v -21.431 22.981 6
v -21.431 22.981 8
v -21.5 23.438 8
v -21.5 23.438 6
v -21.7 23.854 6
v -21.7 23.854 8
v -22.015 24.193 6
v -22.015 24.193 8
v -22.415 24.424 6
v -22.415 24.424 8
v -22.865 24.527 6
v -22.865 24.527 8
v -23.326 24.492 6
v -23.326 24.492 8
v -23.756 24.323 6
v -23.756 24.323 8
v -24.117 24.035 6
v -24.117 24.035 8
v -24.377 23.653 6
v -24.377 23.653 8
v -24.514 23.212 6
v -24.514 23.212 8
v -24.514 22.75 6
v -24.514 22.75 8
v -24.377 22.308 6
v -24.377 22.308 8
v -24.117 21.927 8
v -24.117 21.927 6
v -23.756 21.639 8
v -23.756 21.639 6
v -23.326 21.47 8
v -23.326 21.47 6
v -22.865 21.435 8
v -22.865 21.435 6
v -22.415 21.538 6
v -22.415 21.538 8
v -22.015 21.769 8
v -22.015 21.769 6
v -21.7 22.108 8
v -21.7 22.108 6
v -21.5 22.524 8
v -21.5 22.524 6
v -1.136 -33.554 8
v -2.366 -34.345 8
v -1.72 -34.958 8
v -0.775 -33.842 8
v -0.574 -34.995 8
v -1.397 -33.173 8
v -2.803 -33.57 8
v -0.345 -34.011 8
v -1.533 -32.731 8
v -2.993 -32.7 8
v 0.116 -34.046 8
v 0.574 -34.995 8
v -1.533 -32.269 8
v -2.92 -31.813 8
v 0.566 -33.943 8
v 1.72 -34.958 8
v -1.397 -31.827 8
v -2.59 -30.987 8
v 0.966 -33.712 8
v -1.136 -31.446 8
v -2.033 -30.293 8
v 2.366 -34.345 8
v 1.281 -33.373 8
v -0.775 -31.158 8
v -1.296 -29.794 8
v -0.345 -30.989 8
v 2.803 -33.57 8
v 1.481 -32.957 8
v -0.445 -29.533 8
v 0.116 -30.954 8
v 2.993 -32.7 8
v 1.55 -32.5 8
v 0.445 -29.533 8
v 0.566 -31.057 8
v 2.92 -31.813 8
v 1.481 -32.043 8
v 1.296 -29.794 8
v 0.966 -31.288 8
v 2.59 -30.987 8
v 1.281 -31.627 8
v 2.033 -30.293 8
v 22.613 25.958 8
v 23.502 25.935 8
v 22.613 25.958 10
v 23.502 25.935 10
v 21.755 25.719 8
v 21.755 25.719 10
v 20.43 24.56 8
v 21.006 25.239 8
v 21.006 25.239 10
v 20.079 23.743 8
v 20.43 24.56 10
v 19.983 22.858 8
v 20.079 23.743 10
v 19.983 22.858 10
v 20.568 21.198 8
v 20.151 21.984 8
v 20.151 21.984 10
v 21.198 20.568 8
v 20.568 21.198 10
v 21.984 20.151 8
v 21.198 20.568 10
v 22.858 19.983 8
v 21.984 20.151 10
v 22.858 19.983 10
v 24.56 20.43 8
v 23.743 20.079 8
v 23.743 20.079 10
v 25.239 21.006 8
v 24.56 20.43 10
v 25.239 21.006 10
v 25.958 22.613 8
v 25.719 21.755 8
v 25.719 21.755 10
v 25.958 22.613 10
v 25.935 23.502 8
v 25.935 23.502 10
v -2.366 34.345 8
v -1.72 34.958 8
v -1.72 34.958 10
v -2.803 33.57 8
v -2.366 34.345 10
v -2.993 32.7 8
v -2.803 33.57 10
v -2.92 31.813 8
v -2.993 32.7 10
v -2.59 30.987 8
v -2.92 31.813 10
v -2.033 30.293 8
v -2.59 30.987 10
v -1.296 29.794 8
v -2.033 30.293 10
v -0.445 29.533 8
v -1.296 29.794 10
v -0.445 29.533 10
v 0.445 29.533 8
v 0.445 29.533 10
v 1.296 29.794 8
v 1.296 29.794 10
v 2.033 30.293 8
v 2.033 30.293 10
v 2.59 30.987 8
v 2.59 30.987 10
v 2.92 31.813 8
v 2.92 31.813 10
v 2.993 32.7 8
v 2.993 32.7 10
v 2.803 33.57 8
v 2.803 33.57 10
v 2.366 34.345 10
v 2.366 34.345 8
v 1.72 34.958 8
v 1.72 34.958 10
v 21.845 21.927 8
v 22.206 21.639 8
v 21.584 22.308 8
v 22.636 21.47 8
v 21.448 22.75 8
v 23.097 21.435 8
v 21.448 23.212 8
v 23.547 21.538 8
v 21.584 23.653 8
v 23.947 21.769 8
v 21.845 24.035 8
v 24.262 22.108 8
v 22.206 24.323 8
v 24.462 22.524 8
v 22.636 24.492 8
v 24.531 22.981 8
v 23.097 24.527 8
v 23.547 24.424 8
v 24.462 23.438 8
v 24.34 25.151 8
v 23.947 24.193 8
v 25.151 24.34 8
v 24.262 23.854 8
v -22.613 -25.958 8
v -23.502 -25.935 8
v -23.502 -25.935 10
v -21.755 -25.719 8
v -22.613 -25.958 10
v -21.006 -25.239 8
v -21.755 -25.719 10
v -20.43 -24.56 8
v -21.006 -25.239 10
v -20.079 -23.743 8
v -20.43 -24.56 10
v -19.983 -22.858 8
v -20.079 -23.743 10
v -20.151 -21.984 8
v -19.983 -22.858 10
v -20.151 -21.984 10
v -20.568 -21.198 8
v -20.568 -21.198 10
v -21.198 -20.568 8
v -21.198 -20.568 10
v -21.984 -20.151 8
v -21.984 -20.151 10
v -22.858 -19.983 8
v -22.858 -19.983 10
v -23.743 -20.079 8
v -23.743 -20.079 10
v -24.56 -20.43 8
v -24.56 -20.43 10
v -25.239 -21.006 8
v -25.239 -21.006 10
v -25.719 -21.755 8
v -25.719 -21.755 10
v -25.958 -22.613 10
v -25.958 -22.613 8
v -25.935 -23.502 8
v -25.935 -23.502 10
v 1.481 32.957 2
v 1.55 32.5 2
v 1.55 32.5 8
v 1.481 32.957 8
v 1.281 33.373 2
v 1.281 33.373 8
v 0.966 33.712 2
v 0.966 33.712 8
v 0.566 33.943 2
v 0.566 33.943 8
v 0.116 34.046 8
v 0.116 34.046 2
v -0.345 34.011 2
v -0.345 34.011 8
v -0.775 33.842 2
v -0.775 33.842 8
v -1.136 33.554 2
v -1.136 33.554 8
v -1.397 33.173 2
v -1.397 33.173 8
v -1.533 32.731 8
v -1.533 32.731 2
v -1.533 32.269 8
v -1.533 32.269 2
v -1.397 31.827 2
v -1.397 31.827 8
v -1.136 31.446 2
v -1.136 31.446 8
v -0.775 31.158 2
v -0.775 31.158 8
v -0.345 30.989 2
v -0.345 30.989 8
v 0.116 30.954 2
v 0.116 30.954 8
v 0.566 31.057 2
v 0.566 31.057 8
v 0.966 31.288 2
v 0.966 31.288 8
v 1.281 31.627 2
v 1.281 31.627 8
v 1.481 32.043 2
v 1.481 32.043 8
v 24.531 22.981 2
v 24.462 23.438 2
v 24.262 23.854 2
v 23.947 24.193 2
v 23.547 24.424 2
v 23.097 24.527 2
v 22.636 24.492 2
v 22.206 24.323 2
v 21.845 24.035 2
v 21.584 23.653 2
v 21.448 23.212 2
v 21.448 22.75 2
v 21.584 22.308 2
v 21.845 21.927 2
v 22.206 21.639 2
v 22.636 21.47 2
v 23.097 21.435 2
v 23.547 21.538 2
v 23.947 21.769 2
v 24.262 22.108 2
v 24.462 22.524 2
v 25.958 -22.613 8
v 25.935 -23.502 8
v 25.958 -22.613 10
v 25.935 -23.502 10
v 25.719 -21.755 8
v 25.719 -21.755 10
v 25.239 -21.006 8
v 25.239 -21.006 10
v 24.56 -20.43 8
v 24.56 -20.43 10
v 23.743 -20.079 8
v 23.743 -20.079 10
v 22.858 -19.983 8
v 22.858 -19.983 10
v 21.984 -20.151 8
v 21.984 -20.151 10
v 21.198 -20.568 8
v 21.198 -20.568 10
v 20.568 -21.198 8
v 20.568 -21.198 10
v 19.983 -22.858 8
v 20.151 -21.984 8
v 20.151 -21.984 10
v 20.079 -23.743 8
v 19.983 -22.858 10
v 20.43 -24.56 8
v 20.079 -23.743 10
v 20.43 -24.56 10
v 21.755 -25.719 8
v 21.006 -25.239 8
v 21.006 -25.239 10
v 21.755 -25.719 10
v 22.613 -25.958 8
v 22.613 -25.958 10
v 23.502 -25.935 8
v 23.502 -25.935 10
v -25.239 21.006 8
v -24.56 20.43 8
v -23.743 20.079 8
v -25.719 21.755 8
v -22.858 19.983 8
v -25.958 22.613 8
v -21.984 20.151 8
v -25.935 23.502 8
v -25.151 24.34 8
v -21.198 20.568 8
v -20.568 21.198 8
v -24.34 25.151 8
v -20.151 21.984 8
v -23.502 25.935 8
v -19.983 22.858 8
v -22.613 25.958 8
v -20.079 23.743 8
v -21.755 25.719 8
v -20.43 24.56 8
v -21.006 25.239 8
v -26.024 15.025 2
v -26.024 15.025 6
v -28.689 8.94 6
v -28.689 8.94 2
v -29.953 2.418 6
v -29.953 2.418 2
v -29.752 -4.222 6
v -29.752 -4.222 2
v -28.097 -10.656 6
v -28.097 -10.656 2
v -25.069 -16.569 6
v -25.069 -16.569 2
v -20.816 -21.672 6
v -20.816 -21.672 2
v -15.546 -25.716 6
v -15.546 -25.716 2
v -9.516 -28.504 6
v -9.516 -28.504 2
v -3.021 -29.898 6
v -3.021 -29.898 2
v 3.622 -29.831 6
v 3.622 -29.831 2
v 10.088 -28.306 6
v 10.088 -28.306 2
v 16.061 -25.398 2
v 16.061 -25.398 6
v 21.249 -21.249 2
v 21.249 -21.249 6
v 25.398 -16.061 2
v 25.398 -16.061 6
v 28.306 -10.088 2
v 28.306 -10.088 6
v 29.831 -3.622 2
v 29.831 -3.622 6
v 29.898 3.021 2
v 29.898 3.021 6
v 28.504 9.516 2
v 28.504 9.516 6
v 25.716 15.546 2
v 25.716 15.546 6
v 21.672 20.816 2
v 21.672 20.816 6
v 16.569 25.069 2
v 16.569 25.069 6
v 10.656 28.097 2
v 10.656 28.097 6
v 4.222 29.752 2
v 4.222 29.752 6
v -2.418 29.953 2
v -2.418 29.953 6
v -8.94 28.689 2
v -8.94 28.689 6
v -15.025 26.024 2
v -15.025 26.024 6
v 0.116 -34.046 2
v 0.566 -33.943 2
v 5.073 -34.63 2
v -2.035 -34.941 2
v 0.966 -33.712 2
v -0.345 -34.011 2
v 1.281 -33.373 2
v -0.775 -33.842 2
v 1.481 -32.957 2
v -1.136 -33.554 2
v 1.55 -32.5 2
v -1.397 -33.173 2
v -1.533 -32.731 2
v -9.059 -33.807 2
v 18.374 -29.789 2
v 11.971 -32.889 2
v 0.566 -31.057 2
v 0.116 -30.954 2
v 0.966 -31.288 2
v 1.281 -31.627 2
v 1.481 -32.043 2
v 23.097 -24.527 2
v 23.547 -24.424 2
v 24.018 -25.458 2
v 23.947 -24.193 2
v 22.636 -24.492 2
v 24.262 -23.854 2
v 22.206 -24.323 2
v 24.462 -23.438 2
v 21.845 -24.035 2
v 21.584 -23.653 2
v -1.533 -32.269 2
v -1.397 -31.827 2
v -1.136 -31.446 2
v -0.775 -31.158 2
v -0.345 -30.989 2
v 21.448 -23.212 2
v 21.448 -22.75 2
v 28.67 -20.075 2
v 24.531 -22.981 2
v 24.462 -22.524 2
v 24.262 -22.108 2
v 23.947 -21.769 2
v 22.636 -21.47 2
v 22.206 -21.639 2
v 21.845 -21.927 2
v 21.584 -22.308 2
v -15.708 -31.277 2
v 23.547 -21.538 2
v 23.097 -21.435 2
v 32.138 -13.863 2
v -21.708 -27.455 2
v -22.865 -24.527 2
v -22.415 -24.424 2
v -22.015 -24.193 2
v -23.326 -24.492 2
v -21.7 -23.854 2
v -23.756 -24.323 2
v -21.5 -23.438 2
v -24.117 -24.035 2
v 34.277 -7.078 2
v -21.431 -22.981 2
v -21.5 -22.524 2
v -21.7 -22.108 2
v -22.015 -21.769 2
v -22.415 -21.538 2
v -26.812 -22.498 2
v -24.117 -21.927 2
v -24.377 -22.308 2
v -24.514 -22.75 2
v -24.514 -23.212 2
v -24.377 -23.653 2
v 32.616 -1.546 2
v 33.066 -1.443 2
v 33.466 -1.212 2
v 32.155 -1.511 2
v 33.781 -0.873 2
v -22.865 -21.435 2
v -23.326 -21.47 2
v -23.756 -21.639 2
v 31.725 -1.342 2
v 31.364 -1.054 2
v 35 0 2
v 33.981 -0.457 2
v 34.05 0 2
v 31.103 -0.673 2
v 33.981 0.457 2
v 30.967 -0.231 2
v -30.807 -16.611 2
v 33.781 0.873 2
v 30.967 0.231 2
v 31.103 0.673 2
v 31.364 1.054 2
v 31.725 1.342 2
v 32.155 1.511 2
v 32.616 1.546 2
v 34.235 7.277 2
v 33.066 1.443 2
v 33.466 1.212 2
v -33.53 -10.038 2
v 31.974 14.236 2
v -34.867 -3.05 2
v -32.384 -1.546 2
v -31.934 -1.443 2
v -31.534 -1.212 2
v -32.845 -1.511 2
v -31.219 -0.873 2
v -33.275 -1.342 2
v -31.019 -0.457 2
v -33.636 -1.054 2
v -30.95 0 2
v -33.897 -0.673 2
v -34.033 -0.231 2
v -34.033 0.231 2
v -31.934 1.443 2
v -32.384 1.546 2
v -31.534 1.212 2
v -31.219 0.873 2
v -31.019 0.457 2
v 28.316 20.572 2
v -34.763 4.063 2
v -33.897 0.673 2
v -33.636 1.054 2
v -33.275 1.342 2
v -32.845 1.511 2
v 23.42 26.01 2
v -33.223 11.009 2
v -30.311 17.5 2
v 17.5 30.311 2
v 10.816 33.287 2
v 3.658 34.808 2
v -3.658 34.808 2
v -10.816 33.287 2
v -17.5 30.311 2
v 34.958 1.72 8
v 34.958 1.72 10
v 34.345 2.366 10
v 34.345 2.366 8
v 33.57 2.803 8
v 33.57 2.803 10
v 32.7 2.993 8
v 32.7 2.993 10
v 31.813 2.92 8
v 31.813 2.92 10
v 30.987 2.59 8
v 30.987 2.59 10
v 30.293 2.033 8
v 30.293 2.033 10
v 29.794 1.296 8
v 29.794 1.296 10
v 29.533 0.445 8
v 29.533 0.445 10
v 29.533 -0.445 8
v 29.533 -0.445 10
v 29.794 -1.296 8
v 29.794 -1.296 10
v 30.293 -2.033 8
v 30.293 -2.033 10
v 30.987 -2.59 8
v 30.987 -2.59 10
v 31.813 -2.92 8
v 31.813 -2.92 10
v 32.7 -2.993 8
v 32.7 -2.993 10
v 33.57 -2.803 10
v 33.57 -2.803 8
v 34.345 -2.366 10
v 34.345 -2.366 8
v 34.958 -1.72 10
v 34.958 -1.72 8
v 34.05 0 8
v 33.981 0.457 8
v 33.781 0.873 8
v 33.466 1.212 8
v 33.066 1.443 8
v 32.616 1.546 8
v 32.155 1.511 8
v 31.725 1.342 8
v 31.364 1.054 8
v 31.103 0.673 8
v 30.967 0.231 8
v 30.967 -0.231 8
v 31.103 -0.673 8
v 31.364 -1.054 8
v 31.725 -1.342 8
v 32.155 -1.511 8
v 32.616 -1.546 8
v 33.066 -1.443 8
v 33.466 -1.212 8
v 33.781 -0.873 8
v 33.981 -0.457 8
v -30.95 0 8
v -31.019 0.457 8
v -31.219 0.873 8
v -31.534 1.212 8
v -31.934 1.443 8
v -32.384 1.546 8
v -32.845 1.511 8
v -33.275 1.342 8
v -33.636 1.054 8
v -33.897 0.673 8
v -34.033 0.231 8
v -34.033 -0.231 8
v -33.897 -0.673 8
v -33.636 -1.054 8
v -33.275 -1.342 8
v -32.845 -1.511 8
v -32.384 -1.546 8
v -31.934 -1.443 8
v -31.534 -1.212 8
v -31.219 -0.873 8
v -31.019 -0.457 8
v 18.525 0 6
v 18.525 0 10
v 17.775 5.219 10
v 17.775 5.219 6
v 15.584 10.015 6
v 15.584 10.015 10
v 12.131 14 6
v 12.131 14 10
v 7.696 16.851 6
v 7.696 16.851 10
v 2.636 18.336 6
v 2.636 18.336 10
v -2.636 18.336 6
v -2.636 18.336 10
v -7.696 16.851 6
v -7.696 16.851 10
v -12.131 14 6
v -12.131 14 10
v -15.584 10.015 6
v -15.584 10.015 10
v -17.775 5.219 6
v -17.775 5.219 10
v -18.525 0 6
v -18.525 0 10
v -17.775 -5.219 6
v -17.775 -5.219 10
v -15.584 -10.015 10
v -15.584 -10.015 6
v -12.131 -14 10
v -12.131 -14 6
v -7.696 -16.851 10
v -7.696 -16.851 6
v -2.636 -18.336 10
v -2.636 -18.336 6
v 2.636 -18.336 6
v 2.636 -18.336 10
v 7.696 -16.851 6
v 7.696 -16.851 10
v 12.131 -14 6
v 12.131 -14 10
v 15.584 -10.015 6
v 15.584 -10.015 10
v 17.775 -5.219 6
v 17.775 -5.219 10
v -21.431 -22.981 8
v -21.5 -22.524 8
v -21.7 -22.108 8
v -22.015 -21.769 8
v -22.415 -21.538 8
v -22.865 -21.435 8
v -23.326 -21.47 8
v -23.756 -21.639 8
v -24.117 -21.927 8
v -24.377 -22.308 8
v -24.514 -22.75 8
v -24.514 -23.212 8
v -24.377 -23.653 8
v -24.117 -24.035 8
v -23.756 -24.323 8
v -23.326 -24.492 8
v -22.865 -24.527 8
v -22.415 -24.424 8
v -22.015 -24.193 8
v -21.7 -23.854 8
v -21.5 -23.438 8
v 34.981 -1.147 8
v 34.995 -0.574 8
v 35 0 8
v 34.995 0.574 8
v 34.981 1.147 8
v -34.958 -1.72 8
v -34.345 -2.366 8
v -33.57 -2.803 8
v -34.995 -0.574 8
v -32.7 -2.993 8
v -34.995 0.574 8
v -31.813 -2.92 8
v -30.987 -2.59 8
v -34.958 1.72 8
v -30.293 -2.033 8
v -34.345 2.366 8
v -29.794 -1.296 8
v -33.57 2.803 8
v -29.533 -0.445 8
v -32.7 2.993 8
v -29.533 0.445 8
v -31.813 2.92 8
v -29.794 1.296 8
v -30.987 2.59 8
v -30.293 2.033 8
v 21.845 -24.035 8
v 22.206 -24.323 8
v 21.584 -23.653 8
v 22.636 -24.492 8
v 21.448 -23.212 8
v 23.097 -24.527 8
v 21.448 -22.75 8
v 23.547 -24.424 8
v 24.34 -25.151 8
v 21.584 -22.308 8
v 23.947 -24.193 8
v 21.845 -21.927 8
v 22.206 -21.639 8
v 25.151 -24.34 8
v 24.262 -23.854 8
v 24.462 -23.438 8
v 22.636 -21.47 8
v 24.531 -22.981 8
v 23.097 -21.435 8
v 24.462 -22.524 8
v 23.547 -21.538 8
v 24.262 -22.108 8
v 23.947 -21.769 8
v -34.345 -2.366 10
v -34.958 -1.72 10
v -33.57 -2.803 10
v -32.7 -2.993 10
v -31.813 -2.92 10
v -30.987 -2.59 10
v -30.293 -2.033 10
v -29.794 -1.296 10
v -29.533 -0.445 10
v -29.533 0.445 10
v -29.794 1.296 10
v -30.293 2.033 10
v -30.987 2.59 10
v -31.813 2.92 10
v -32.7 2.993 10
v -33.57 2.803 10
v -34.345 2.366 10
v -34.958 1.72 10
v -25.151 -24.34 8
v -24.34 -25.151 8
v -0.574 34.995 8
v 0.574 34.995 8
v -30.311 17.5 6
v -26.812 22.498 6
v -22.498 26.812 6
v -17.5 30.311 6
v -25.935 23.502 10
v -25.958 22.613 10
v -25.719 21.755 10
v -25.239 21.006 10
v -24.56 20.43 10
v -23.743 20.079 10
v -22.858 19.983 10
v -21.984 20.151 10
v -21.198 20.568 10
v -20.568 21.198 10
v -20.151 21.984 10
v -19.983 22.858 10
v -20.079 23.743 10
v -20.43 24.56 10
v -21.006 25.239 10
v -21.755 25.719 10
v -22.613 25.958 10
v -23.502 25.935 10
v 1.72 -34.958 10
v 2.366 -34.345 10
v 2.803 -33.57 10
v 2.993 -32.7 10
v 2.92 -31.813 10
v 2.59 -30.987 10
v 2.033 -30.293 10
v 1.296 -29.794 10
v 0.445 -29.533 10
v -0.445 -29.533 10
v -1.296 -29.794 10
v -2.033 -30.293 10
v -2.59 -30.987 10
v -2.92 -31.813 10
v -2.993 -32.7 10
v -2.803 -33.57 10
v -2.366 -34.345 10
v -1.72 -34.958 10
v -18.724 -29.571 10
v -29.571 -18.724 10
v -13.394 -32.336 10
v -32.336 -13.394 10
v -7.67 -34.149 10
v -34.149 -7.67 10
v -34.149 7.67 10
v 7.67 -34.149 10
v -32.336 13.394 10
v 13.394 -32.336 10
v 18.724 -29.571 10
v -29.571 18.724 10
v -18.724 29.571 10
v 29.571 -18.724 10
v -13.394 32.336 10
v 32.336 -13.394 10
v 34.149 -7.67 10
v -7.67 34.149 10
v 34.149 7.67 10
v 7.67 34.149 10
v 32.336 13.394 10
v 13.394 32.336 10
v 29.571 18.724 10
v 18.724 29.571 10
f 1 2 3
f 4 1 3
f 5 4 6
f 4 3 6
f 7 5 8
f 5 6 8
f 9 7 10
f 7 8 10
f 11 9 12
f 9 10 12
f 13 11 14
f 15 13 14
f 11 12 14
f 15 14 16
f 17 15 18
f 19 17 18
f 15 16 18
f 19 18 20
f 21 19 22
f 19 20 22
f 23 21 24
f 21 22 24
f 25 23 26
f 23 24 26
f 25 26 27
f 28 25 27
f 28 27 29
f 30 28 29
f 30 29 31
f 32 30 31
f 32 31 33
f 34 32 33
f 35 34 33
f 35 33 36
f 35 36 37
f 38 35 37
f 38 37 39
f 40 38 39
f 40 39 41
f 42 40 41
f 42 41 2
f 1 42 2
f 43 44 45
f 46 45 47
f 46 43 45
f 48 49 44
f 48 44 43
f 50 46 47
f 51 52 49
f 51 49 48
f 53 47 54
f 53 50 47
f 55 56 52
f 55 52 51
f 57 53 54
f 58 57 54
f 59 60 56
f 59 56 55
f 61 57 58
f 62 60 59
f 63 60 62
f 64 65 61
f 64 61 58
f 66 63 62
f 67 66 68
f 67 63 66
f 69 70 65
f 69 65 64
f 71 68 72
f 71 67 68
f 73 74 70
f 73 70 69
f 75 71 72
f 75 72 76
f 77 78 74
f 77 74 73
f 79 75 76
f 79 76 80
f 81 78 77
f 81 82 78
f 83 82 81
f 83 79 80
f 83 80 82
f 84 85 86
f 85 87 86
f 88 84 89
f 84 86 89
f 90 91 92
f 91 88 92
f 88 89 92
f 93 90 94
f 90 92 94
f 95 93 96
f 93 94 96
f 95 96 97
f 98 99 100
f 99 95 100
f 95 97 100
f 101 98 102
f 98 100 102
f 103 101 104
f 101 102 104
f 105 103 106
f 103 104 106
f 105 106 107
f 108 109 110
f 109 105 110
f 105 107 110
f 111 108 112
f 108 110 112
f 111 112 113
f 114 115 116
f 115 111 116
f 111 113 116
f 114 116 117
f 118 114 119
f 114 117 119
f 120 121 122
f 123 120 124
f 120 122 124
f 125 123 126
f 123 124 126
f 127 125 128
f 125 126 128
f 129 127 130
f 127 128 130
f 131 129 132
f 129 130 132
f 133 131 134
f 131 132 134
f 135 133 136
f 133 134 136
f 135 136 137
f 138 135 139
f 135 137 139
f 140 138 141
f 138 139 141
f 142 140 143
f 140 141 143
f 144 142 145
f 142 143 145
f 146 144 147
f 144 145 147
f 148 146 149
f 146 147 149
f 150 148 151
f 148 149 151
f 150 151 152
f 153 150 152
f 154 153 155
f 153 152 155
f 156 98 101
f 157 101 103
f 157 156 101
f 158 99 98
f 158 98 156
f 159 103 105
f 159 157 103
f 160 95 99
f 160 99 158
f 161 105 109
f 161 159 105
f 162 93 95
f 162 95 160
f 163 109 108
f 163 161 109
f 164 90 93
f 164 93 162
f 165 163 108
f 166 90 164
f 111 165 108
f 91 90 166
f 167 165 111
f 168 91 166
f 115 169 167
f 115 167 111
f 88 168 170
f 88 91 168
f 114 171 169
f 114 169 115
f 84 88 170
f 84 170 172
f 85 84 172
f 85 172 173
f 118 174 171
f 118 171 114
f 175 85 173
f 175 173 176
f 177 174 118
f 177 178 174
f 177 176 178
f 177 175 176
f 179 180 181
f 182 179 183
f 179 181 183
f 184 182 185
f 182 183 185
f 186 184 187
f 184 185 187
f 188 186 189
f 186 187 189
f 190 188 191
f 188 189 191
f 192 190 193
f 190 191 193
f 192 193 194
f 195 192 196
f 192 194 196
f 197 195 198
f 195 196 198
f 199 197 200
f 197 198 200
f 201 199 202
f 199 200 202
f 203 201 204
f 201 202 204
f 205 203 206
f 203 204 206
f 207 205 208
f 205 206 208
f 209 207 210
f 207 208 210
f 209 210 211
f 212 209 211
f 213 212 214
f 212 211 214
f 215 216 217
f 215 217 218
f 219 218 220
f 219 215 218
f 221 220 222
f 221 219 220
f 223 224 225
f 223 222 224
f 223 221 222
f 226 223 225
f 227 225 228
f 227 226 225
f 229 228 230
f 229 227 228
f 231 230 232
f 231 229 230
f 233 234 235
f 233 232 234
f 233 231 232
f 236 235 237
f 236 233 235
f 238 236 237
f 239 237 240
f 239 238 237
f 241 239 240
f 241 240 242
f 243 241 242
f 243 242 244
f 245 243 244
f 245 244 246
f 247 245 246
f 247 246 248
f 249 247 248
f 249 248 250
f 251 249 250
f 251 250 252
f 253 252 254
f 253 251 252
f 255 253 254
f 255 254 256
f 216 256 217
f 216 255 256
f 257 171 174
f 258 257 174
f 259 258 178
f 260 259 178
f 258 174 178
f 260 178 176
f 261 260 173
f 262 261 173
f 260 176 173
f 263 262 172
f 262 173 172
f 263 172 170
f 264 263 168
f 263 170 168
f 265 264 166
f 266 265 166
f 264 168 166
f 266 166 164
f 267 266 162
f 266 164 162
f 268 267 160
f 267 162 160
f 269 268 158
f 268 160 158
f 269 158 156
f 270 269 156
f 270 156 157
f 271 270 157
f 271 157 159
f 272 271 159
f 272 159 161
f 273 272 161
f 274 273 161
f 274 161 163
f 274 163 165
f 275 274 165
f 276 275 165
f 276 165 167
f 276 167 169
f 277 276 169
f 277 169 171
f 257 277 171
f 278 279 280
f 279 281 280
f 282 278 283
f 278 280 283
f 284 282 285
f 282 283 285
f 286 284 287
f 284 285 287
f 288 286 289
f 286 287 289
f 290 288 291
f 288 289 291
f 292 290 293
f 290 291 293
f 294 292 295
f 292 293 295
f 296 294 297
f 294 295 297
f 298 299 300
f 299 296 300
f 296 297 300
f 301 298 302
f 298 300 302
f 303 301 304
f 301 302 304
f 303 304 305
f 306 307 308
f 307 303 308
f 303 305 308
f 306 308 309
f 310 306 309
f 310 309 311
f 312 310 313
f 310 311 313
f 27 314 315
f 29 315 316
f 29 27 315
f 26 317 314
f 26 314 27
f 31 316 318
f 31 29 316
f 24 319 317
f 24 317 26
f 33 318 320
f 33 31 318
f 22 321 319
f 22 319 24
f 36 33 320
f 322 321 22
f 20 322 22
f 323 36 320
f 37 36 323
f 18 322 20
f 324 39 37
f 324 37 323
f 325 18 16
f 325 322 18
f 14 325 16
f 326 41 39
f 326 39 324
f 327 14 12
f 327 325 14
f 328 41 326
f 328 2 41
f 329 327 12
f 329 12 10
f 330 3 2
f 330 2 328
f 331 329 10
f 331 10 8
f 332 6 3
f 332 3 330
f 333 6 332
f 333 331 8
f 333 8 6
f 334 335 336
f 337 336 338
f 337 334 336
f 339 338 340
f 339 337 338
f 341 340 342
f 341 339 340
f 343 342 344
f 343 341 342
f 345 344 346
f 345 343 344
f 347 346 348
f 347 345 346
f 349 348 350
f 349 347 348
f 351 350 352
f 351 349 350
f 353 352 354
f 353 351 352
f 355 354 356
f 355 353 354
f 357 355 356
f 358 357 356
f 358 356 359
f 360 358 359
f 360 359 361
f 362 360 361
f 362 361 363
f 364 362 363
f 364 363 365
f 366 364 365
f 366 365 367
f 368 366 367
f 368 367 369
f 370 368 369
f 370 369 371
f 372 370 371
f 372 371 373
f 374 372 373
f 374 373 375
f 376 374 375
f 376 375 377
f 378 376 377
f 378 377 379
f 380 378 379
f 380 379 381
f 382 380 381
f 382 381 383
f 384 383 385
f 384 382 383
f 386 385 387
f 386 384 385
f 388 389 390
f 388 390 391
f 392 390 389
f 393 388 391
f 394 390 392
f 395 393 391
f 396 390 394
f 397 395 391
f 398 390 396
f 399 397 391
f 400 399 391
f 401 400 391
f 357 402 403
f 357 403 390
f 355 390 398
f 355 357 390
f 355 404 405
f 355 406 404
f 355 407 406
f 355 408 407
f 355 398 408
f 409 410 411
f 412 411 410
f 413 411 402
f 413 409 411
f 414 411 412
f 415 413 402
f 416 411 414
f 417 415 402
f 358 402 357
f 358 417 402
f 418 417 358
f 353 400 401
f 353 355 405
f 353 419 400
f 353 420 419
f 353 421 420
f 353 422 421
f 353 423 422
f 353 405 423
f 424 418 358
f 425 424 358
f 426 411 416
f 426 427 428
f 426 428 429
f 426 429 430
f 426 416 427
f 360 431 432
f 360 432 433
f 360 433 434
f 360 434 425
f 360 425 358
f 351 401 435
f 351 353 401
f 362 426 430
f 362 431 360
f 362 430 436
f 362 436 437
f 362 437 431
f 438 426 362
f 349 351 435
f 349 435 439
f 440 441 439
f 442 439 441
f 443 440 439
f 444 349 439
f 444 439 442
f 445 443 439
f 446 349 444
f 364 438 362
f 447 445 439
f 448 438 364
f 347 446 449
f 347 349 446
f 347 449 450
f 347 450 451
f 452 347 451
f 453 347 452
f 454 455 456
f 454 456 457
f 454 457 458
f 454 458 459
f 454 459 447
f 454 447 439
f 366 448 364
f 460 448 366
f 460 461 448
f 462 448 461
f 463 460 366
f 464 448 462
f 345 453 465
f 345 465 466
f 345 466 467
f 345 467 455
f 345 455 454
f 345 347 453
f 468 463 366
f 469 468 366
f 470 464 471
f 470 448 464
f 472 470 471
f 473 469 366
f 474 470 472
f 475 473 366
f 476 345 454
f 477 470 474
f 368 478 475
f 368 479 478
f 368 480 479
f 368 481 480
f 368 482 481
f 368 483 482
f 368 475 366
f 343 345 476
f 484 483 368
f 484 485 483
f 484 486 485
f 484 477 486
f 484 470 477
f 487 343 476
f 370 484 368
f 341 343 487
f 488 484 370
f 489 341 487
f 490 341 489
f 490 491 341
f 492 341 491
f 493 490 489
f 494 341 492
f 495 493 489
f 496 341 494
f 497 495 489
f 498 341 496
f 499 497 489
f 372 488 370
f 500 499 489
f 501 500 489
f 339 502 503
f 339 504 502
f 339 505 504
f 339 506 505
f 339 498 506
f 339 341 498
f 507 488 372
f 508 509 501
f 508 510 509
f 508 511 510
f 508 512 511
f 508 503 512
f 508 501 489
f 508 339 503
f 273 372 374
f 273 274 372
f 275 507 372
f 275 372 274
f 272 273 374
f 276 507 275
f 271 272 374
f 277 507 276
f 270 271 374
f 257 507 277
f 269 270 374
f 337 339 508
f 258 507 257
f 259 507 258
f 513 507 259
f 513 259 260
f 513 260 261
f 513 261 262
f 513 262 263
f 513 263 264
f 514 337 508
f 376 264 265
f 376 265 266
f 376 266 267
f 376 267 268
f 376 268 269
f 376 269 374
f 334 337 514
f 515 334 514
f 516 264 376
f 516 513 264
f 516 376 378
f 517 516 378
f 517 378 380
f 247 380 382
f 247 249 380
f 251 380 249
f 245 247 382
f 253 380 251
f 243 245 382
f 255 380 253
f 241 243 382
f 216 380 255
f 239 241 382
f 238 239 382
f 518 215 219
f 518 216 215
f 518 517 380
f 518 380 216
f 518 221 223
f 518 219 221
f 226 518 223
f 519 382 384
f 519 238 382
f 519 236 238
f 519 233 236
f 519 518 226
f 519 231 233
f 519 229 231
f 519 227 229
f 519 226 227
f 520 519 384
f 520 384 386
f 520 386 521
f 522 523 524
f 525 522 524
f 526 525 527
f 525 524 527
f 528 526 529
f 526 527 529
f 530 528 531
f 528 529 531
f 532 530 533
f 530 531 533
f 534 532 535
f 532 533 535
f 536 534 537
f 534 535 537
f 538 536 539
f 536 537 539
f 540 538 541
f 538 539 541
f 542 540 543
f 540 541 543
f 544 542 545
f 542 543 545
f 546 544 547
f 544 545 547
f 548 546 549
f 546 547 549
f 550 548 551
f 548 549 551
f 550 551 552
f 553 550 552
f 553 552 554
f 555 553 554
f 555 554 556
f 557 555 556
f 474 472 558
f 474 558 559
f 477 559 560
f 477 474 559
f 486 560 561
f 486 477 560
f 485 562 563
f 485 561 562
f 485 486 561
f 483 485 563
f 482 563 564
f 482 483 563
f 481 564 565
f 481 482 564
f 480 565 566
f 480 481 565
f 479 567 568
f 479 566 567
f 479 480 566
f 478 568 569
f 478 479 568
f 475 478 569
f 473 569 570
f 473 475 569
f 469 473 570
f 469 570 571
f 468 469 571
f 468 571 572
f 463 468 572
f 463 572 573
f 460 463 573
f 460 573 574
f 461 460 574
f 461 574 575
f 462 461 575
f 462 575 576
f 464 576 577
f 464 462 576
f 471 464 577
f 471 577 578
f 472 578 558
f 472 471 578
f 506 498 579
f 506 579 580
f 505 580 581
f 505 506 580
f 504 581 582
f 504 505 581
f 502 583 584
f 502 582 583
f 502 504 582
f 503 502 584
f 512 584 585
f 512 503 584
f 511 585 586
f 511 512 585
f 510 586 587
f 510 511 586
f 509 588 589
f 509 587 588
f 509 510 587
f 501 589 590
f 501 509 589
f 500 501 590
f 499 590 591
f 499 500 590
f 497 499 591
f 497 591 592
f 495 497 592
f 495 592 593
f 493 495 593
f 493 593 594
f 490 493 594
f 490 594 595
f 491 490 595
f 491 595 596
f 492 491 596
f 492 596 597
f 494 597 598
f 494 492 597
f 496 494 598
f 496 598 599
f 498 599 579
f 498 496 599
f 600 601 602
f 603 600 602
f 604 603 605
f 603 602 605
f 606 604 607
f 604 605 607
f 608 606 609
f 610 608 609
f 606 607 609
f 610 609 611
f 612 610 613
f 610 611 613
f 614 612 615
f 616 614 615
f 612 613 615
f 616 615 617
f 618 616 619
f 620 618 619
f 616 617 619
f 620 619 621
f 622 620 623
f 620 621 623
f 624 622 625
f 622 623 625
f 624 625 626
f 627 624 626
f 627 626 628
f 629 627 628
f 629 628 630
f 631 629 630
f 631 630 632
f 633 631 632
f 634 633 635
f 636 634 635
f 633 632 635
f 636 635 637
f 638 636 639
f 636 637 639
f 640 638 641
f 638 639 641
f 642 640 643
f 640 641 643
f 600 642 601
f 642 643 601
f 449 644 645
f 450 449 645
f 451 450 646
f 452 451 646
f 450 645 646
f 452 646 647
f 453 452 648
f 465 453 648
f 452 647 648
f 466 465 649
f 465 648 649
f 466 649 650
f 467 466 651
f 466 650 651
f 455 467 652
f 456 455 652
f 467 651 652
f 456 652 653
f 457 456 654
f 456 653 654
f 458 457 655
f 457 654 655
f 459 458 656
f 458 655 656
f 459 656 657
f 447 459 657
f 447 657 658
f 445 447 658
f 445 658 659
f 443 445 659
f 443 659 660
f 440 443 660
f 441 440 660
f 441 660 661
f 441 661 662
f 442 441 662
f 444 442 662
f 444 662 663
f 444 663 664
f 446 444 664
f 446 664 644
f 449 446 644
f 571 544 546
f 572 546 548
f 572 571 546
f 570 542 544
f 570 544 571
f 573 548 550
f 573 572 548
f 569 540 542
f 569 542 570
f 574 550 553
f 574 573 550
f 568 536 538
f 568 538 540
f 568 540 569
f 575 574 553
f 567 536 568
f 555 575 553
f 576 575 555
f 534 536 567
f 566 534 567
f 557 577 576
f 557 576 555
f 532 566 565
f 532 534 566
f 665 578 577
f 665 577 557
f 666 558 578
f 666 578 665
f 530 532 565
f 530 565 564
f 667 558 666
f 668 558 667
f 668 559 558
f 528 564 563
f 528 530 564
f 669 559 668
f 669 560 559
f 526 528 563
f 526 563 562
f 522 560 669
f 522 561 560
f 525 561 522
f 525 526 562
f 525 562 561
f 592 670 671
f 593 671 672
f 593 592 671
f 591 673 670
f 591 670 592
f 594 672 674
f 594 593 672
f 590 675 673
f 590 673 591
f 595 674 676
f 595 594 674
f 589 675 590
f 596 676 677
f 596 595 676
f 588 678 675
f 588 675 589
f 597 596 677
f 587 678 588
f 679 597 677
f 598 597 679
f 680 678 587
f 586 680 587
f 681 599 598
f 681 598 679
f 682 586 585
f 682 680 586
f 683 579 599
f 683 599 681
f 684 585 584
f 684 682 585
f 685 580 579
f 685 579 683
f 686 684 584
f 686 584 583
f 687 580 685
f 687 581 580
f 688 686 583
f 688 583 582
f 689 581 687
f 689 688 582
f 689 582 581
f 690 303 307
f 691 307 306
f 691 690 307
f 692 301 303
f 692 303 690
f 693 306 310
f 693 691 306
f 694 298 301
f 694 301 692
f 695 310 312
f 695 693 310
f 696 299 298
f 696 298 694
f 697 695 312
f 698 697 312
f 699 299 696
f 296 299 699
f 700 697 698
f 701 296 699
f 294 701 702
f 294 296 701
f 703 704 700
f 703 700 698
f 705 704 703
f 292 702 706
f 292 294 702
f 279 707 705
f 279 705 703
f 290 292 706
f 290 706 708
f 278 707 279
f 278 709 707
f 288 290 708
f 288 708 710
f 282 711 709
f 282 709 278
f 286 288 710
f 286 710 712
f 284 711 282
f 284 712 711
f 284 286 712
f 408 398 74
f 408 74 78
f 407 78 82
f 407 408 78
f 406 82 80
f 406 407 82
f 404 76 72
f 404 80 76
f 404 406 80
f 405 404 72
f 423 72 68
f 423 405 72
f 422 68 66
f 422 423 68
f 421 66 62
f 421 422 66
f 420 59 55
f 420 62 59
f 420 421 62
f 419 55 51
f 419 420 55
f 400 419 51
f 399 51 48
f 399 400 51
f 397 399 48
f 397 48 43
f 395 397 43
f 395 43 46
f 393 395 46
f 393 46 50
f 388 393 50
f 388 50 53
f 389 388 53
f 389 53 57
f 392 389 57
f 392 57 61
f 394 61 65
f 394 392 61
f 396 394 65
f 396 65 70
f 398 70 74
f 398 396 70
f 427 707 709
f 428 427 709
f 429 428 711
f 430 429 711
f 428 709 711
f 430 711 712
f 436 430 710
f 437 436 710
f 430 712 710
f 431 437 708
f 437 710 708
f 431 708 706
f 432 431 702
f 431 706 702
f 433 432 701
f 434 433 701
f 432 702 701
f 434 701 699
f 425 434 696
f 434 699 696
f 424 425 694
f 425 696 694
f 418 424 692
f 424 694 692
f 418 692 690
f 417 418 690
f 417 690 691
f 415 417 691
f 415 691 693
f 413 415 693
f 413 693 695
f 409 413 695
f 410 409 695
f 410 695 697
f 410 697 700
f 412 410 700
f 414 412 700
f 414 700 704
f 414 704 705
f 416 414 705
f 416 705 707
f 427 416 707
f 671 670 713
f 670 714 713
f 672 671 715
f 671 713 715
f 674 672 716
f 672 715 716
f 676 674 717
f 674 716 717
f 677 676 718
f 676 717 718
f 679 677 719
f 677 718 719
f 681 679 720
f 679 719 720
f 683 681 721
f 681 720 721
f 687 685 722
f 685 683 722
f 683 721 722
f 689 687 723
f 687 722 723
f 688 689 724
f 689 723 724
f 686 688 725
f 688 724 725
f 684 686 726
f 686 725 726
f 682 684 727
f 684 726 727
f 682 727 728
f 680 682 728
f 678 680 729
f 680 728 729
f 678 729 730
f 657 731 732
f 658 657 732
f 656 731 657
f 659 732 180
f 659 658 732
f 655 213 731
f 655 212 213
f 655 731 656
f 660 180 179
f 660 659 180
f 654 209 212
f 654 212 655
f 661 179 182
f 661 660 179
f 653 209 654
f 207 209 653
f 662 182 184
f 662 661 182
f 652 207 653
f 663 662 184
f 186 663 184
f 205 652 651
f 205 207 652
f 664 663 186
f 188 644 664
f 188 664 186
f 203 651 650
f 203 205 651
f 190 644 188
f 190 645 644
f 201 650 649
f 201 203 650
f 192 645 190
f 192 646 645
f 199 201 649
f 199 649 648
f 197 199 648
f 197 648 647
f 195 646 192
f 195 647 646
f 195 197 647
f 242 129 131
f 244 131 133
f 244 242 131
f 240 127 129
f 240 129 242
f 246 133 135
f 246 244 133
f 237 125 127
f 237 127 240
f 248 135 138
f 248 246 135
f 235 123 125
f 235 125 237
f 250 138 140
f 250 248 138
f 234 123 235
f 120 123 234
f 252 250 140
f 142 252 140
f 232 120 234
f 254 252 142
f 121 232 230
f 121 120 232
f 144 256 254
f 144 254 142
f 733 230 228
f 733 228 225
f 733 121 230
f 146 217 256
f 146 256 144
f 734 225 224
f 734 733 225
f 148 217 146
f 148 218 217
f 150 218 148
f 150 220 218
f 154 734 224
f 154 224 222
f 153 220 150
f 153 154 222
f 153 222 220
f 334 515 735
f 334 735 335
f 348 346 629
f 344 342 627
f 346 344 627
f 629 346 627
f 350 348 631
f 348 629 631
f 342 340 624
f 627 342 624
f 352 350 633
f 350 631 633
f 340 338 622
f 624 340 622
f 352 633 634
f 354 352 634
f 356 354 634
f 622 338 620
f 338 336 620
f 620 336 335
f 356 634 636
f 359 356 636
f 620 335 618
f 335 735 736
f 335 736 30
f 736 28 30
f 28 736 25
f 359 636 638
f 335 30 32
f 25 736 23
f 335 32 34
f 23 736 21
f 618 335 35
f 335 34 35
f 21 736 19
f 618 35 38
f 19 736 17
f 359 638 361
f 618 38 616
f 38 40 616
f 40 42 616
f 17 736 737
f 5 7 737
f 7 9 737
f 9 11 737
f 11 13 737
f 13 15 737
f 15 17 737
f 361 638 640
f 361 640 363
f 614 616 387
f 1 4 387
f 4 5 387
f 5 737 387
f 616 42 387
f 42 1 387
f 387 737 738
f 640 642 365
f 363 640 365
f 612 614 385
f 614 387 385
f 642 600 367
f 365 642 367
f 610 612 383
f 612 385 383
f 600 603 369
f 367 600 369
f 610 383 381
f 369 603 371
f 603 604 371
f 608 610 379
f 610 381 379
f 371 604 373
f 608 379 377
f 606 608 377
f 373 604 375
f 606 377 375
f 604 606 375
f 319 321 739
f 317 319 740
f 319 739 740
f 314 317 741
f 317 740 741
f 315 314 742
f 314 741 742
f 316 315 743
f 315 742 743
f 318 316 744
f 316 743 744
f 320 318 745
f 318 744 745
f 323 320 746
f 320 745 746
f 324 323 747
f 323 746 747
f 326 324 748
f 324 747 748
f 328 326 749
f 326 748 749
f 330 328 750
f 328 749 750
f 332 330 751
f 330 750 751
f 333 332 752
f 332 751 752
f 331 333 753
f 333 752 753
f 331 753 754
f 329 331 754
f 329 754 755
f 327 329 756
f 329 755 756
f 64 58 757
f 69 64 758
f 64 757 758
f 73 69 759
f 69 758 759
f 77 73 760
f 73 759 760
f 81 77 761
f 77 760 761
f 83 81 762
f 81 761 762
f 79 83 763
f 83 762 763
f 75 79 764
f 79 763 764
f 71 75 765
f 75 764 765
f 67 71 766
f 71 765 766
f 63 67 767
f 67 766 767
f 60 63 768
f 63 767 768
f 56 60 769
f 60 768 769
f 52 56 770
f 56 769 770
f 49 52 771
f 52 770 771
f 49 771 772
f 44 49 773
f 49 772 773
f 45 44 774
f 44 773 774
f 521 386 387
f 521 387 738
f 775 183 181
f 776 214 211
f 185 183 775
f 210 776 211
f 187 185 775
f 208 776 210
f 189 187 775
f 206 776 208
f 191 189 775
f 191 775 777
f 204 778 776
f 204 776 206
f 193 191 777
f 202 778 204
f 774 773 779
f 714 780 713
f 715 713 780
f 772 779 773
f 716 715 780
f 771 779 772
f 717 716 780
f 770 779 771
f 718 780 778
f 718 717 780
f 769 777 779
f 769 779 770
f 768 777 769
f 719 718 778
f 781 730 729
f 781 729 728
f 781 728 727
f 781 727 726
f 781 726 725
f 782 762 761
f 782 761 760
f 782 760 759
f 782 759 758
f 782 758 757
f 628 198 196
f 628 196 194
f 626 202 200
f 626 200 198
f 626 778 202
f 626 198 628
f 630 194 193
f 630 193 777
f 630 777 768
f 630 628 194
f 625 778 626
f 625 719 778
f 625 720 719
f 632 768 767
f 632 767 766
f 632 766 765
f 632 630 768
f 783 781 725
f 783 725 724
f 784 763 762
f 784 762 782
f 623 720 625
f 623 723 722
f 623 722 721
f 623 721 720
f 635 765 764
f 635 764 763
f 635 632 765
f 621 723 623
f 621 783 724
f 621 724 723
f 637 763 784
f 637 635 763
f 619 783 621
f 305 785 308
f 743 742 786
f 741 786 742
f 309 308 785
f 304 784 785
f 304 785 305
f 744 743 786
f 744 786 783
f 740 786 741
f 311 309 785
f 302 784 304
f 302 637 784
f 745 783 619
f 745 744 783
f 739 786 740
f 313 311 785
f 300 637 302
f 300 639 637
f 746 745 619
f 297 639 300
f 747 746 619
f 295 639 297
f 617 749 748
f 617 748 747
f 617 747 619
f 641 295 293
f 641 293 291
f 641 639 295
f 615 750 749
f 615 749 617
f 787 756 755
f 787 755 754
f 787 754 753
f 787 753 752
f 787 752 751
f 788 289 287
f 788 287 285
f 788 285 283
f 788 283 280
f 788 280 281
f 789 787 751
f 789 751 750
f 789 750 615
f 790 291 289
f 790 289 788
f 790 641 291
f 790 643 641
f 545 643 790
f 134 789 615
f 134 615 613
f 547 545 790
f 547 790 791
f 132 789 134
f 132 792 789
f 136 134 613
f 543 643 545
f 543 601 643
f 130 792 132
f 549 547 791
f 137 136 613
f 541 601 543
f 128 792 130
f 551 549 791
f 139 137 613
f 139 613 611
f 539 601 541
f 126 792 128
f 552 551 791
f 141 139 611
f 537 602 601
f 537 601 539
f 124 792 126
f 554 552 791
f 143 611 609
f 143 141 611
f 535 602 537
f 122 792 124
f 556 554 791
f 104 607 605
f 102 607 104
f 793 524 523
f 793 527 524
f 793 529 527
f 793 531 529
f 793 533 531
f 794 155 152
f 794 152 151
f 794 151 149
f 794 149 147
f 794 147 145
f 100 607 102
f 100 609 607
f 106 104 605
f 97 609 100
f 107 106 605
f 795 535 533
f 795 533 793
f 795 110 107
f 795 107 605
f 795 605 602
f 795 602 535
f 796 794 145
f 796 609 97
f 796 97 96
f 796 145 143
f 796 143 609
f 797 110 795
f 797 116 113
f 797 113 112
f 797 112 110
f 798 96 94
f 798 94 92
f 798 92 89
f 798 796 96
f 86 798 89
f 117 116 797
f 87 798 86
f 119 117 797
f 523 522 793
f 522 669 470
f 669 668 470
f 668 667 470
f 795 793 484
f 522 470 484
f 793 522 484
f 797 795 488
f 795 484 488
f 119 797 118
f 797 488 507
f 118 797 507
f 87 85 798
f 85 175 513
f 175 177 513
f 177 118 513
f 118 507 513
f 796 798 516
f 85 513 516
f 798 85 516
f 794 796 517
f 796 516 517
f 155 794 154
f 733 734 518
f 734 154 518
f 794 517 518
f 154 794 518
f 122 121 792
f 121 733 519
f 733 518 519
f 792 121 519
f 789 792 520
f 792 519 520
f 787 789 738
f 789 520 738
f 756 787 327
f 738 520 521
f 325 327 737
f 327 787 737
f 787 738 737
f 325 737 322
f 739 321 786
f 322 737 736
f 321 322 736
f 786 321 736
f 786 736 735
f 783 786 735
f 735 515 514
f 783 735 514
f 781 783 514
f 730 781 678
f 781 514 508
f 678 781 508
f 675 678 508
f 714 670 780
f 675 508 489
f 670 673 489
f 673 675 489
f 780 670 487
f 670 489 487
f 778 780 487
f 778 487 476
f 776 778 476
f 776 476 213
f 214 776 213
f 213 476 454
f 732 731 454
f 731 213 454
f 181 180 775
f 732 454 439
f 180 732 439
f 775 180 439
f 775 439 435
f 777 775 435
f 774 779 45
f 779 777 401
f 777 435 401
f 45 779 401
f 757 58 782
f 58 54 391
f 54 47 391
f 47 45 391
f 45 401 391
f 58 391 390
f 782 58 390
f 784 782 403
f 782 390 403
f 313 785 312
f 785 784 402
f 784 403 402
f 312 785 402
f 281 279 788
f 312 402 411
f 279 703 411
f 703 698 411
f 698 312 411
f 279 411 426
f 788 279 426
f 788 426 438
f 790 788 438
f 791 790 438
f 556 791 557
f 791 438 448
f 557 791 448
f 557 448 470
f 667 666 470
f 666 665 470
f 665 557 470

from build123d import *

# Parameters (mm, degrees)
EXTRUDE_1_OUTLINE_R   = 35
EXTRUDE_1_OUTLINE_R_2 = 1.55
EXTRUDE_1_OUTLINE_R_3 = 30.05
EXTRUDE_1_DEPTH       = 10
SKETCH_2_R            = 33.525
SKETCH_2_R_2          = 18.525
EXTRUDE_1_2_DEPTH     = 4
SKETCH_3_R            = 1.55
CUT_EXTRUDE_1_DEPTH   = 51.497524692
CUT_EXTRUDE_2_DEPTH   = 6
SKETCH_8_R            = 35
SKETCH_8_R_2          = 30.05
CUT_EXTRUDE_3_DEPTH   = 2
SKETCH_9_R            = 3
CUT_EXTRUDE_4_DEPTH   = 2
SKETCH_10_R           = 1.55
CUT_EXTRUDE_5_DEPTH   = 51.139804547
SKETCH_11_R           = 3
CUT_EXTRUDE_6_DEPTH   = 2


# Read off the part's stored shape, not the designer's step: 凸台-拉伸1
with BuildPart() as part:
    # Extrude 1 outline → Extrude 1 (new body)
    with BuildSketch(Plane.XY):
        Circle(EXTRUDE_1_OUTLINE_R)
        with Locations((0, -32.5)):
            Circle(EXTRUDE_1_OUTLINE_R_2, mode=Mode.SUBTRACT)
        with Locations((-32.5, 0)):
            Circle(EXTRUDE_1_OUTLINE_R_2, mode=Mode.SUBTRACT)
        Circle(EXTRUDE_1_OUTLINE_R_3, mode=Mode.SUBTRACT)
        with Locations((32.5, 0)):
            Circle(EXTRUDE_1_OUTLINE_R_2, mode=Mode.SUBTRACT)
        with Locations((0, 32.5)):
            Circle(EXTRUDE_1_OUTLINE_R_2, mode=Mode.SUBTRACT)
    extrude(amount=EXTRUDE_1_DEPTH)

    # 草图2 → Extrude 1 2 (add)
    with BuildSketch(Plane.XY.offset(10)):
        Circle(SKETCH_2_R)
        Circle(SKETCH_2_R_2, mode=Mode.SUBTRACT)
    extrude(amount=-EXTRUDE_1_2_DEPTH)

    # 草图3 → 切除-拉伸1 (cut, through all)
    with BuildSketch(Plane(origin=(0, 0, 0), x_dir=(-1, 0, 0), z_dir=(0, 0, -1))):
        with Locations(Location((32.5, 0, 0), (0, 0, 180))):
            Circle(SKETCH_3_R)
        with Locations(Location((0, -32.5, 0), (0, 0, 180))):
            Circle(SKETCH_3_R)
        with Locations(Location((-32.5, 0, 0), (0, 0, 180))):
            Circle(SKETCH_3_R)
        with Locations(Location((0, 32.5, 0), (0, 0, 180))):
            Circle(SKETCH_3_R)
    extrude(amount=-CUT_EXTRUDE_1_DEPTH, mode=Mode.SUBTRACT)

    # 草图7 → 切除-拉伸2 (cut)
    with BuildSketch(Plane(origin=(0, 0, 0), x_dir=(-1, 0, 0), z_dir=(0, 0, -1))):
        with BuildLine():
            Line((15.025, 26.024063384), (17.5, 30.310889132))
            ThreePointArc((17.5, 30.310889132), (24.748737342, 24.748737342), (30.310889132, 17.5))
            Line((30.310889132, 17.5), (26.024063384, 15.025))
            ThreePointArc((26.024063384, 15.025), (21.248558775, 21.248558775), (15.025, 26.024063384))
        make_face()
    extrude(amount=-CUT_EXTRUDE_2_DEPTH, mode=Mode.SUBTRACT)

    # 草图8 → 切除-拉伸3 (cut)
    with BuildSketch(Plane(origin=(0, 0, 0), x_dir=(-1, 0, 0), z_dir=(0, 0, -1))):
        with Locations(Location((0, 0, 0), (0, 0, 30))):
            Circle(SKETCH_8_R)
        Circle(SKETCH_8_R_2, mode=Mode.SUBTRACT)
    extrude(amount=-CUT_EXTRUDE_3_DEPTH, mode=Mode.SUBTRACT)

    # 草图9 → 切除-拉伸4 (cut)
    with BuildSketch(Plane.XY.offset(10)):
        with Locations((0, 32.5)):
            Circle(SKETCH_9_R)
        with Locations((32.5, 0)):
            Circle(SKETCH_9_R)
        with Locations((0, -32.5)):
            Circle(SKETCH_9_R)
        with Locations((-32.5, 0)):
            Circle(SKETCH_9_R)
    extrude(amount=-CUT_EXTRUDE_4_DEPTH, mode=Mode.SUBTRACT)

    # 草图10 → 切除-拉伸5 (cut, through all)
    with BuildSketch(Plane.XY.offset(10)):
        with Locations((22.980970389, 22.980970389)):
            Circle(SKETCH_10_R)
        with Locations((22.980970389, -22.980970389)):
            Circle(SKETCH_10_R)
        with Locations((-22.980970389, -22.980970389)):
            Circle(SKETCH_10_R)
        with Locations((-22.980970389, 22.980970389)):
            Circle(SKETCH_10_R)
    extrude(amount=-CUT_EXTRUDE_5_DEPTH, mode=Mode.SUBTRACT)

    # 草图11 → 切除-拉伸6 (cut)
    with BuildSketch(Plane.XY.offset(10)):
        with Locations((22.980970389, 22.980970389)):
            Circle(SKETCH_11_R)
        with Locations((22.980970389, -22.980970389)):
            Circle(SKETCH_11_R)
        with Locations((-22.980970389, -22.980970389)):
            Circle(SKETCH_11_R)
        with Locations((-22.980970389, 22.980970389)):
            Circle(SKETCH_11_R)
    extrude(amount=-CUT_EXTRUDE_6_DEPTH, mode=Mode.SUBTRACT)


solid = part.part
